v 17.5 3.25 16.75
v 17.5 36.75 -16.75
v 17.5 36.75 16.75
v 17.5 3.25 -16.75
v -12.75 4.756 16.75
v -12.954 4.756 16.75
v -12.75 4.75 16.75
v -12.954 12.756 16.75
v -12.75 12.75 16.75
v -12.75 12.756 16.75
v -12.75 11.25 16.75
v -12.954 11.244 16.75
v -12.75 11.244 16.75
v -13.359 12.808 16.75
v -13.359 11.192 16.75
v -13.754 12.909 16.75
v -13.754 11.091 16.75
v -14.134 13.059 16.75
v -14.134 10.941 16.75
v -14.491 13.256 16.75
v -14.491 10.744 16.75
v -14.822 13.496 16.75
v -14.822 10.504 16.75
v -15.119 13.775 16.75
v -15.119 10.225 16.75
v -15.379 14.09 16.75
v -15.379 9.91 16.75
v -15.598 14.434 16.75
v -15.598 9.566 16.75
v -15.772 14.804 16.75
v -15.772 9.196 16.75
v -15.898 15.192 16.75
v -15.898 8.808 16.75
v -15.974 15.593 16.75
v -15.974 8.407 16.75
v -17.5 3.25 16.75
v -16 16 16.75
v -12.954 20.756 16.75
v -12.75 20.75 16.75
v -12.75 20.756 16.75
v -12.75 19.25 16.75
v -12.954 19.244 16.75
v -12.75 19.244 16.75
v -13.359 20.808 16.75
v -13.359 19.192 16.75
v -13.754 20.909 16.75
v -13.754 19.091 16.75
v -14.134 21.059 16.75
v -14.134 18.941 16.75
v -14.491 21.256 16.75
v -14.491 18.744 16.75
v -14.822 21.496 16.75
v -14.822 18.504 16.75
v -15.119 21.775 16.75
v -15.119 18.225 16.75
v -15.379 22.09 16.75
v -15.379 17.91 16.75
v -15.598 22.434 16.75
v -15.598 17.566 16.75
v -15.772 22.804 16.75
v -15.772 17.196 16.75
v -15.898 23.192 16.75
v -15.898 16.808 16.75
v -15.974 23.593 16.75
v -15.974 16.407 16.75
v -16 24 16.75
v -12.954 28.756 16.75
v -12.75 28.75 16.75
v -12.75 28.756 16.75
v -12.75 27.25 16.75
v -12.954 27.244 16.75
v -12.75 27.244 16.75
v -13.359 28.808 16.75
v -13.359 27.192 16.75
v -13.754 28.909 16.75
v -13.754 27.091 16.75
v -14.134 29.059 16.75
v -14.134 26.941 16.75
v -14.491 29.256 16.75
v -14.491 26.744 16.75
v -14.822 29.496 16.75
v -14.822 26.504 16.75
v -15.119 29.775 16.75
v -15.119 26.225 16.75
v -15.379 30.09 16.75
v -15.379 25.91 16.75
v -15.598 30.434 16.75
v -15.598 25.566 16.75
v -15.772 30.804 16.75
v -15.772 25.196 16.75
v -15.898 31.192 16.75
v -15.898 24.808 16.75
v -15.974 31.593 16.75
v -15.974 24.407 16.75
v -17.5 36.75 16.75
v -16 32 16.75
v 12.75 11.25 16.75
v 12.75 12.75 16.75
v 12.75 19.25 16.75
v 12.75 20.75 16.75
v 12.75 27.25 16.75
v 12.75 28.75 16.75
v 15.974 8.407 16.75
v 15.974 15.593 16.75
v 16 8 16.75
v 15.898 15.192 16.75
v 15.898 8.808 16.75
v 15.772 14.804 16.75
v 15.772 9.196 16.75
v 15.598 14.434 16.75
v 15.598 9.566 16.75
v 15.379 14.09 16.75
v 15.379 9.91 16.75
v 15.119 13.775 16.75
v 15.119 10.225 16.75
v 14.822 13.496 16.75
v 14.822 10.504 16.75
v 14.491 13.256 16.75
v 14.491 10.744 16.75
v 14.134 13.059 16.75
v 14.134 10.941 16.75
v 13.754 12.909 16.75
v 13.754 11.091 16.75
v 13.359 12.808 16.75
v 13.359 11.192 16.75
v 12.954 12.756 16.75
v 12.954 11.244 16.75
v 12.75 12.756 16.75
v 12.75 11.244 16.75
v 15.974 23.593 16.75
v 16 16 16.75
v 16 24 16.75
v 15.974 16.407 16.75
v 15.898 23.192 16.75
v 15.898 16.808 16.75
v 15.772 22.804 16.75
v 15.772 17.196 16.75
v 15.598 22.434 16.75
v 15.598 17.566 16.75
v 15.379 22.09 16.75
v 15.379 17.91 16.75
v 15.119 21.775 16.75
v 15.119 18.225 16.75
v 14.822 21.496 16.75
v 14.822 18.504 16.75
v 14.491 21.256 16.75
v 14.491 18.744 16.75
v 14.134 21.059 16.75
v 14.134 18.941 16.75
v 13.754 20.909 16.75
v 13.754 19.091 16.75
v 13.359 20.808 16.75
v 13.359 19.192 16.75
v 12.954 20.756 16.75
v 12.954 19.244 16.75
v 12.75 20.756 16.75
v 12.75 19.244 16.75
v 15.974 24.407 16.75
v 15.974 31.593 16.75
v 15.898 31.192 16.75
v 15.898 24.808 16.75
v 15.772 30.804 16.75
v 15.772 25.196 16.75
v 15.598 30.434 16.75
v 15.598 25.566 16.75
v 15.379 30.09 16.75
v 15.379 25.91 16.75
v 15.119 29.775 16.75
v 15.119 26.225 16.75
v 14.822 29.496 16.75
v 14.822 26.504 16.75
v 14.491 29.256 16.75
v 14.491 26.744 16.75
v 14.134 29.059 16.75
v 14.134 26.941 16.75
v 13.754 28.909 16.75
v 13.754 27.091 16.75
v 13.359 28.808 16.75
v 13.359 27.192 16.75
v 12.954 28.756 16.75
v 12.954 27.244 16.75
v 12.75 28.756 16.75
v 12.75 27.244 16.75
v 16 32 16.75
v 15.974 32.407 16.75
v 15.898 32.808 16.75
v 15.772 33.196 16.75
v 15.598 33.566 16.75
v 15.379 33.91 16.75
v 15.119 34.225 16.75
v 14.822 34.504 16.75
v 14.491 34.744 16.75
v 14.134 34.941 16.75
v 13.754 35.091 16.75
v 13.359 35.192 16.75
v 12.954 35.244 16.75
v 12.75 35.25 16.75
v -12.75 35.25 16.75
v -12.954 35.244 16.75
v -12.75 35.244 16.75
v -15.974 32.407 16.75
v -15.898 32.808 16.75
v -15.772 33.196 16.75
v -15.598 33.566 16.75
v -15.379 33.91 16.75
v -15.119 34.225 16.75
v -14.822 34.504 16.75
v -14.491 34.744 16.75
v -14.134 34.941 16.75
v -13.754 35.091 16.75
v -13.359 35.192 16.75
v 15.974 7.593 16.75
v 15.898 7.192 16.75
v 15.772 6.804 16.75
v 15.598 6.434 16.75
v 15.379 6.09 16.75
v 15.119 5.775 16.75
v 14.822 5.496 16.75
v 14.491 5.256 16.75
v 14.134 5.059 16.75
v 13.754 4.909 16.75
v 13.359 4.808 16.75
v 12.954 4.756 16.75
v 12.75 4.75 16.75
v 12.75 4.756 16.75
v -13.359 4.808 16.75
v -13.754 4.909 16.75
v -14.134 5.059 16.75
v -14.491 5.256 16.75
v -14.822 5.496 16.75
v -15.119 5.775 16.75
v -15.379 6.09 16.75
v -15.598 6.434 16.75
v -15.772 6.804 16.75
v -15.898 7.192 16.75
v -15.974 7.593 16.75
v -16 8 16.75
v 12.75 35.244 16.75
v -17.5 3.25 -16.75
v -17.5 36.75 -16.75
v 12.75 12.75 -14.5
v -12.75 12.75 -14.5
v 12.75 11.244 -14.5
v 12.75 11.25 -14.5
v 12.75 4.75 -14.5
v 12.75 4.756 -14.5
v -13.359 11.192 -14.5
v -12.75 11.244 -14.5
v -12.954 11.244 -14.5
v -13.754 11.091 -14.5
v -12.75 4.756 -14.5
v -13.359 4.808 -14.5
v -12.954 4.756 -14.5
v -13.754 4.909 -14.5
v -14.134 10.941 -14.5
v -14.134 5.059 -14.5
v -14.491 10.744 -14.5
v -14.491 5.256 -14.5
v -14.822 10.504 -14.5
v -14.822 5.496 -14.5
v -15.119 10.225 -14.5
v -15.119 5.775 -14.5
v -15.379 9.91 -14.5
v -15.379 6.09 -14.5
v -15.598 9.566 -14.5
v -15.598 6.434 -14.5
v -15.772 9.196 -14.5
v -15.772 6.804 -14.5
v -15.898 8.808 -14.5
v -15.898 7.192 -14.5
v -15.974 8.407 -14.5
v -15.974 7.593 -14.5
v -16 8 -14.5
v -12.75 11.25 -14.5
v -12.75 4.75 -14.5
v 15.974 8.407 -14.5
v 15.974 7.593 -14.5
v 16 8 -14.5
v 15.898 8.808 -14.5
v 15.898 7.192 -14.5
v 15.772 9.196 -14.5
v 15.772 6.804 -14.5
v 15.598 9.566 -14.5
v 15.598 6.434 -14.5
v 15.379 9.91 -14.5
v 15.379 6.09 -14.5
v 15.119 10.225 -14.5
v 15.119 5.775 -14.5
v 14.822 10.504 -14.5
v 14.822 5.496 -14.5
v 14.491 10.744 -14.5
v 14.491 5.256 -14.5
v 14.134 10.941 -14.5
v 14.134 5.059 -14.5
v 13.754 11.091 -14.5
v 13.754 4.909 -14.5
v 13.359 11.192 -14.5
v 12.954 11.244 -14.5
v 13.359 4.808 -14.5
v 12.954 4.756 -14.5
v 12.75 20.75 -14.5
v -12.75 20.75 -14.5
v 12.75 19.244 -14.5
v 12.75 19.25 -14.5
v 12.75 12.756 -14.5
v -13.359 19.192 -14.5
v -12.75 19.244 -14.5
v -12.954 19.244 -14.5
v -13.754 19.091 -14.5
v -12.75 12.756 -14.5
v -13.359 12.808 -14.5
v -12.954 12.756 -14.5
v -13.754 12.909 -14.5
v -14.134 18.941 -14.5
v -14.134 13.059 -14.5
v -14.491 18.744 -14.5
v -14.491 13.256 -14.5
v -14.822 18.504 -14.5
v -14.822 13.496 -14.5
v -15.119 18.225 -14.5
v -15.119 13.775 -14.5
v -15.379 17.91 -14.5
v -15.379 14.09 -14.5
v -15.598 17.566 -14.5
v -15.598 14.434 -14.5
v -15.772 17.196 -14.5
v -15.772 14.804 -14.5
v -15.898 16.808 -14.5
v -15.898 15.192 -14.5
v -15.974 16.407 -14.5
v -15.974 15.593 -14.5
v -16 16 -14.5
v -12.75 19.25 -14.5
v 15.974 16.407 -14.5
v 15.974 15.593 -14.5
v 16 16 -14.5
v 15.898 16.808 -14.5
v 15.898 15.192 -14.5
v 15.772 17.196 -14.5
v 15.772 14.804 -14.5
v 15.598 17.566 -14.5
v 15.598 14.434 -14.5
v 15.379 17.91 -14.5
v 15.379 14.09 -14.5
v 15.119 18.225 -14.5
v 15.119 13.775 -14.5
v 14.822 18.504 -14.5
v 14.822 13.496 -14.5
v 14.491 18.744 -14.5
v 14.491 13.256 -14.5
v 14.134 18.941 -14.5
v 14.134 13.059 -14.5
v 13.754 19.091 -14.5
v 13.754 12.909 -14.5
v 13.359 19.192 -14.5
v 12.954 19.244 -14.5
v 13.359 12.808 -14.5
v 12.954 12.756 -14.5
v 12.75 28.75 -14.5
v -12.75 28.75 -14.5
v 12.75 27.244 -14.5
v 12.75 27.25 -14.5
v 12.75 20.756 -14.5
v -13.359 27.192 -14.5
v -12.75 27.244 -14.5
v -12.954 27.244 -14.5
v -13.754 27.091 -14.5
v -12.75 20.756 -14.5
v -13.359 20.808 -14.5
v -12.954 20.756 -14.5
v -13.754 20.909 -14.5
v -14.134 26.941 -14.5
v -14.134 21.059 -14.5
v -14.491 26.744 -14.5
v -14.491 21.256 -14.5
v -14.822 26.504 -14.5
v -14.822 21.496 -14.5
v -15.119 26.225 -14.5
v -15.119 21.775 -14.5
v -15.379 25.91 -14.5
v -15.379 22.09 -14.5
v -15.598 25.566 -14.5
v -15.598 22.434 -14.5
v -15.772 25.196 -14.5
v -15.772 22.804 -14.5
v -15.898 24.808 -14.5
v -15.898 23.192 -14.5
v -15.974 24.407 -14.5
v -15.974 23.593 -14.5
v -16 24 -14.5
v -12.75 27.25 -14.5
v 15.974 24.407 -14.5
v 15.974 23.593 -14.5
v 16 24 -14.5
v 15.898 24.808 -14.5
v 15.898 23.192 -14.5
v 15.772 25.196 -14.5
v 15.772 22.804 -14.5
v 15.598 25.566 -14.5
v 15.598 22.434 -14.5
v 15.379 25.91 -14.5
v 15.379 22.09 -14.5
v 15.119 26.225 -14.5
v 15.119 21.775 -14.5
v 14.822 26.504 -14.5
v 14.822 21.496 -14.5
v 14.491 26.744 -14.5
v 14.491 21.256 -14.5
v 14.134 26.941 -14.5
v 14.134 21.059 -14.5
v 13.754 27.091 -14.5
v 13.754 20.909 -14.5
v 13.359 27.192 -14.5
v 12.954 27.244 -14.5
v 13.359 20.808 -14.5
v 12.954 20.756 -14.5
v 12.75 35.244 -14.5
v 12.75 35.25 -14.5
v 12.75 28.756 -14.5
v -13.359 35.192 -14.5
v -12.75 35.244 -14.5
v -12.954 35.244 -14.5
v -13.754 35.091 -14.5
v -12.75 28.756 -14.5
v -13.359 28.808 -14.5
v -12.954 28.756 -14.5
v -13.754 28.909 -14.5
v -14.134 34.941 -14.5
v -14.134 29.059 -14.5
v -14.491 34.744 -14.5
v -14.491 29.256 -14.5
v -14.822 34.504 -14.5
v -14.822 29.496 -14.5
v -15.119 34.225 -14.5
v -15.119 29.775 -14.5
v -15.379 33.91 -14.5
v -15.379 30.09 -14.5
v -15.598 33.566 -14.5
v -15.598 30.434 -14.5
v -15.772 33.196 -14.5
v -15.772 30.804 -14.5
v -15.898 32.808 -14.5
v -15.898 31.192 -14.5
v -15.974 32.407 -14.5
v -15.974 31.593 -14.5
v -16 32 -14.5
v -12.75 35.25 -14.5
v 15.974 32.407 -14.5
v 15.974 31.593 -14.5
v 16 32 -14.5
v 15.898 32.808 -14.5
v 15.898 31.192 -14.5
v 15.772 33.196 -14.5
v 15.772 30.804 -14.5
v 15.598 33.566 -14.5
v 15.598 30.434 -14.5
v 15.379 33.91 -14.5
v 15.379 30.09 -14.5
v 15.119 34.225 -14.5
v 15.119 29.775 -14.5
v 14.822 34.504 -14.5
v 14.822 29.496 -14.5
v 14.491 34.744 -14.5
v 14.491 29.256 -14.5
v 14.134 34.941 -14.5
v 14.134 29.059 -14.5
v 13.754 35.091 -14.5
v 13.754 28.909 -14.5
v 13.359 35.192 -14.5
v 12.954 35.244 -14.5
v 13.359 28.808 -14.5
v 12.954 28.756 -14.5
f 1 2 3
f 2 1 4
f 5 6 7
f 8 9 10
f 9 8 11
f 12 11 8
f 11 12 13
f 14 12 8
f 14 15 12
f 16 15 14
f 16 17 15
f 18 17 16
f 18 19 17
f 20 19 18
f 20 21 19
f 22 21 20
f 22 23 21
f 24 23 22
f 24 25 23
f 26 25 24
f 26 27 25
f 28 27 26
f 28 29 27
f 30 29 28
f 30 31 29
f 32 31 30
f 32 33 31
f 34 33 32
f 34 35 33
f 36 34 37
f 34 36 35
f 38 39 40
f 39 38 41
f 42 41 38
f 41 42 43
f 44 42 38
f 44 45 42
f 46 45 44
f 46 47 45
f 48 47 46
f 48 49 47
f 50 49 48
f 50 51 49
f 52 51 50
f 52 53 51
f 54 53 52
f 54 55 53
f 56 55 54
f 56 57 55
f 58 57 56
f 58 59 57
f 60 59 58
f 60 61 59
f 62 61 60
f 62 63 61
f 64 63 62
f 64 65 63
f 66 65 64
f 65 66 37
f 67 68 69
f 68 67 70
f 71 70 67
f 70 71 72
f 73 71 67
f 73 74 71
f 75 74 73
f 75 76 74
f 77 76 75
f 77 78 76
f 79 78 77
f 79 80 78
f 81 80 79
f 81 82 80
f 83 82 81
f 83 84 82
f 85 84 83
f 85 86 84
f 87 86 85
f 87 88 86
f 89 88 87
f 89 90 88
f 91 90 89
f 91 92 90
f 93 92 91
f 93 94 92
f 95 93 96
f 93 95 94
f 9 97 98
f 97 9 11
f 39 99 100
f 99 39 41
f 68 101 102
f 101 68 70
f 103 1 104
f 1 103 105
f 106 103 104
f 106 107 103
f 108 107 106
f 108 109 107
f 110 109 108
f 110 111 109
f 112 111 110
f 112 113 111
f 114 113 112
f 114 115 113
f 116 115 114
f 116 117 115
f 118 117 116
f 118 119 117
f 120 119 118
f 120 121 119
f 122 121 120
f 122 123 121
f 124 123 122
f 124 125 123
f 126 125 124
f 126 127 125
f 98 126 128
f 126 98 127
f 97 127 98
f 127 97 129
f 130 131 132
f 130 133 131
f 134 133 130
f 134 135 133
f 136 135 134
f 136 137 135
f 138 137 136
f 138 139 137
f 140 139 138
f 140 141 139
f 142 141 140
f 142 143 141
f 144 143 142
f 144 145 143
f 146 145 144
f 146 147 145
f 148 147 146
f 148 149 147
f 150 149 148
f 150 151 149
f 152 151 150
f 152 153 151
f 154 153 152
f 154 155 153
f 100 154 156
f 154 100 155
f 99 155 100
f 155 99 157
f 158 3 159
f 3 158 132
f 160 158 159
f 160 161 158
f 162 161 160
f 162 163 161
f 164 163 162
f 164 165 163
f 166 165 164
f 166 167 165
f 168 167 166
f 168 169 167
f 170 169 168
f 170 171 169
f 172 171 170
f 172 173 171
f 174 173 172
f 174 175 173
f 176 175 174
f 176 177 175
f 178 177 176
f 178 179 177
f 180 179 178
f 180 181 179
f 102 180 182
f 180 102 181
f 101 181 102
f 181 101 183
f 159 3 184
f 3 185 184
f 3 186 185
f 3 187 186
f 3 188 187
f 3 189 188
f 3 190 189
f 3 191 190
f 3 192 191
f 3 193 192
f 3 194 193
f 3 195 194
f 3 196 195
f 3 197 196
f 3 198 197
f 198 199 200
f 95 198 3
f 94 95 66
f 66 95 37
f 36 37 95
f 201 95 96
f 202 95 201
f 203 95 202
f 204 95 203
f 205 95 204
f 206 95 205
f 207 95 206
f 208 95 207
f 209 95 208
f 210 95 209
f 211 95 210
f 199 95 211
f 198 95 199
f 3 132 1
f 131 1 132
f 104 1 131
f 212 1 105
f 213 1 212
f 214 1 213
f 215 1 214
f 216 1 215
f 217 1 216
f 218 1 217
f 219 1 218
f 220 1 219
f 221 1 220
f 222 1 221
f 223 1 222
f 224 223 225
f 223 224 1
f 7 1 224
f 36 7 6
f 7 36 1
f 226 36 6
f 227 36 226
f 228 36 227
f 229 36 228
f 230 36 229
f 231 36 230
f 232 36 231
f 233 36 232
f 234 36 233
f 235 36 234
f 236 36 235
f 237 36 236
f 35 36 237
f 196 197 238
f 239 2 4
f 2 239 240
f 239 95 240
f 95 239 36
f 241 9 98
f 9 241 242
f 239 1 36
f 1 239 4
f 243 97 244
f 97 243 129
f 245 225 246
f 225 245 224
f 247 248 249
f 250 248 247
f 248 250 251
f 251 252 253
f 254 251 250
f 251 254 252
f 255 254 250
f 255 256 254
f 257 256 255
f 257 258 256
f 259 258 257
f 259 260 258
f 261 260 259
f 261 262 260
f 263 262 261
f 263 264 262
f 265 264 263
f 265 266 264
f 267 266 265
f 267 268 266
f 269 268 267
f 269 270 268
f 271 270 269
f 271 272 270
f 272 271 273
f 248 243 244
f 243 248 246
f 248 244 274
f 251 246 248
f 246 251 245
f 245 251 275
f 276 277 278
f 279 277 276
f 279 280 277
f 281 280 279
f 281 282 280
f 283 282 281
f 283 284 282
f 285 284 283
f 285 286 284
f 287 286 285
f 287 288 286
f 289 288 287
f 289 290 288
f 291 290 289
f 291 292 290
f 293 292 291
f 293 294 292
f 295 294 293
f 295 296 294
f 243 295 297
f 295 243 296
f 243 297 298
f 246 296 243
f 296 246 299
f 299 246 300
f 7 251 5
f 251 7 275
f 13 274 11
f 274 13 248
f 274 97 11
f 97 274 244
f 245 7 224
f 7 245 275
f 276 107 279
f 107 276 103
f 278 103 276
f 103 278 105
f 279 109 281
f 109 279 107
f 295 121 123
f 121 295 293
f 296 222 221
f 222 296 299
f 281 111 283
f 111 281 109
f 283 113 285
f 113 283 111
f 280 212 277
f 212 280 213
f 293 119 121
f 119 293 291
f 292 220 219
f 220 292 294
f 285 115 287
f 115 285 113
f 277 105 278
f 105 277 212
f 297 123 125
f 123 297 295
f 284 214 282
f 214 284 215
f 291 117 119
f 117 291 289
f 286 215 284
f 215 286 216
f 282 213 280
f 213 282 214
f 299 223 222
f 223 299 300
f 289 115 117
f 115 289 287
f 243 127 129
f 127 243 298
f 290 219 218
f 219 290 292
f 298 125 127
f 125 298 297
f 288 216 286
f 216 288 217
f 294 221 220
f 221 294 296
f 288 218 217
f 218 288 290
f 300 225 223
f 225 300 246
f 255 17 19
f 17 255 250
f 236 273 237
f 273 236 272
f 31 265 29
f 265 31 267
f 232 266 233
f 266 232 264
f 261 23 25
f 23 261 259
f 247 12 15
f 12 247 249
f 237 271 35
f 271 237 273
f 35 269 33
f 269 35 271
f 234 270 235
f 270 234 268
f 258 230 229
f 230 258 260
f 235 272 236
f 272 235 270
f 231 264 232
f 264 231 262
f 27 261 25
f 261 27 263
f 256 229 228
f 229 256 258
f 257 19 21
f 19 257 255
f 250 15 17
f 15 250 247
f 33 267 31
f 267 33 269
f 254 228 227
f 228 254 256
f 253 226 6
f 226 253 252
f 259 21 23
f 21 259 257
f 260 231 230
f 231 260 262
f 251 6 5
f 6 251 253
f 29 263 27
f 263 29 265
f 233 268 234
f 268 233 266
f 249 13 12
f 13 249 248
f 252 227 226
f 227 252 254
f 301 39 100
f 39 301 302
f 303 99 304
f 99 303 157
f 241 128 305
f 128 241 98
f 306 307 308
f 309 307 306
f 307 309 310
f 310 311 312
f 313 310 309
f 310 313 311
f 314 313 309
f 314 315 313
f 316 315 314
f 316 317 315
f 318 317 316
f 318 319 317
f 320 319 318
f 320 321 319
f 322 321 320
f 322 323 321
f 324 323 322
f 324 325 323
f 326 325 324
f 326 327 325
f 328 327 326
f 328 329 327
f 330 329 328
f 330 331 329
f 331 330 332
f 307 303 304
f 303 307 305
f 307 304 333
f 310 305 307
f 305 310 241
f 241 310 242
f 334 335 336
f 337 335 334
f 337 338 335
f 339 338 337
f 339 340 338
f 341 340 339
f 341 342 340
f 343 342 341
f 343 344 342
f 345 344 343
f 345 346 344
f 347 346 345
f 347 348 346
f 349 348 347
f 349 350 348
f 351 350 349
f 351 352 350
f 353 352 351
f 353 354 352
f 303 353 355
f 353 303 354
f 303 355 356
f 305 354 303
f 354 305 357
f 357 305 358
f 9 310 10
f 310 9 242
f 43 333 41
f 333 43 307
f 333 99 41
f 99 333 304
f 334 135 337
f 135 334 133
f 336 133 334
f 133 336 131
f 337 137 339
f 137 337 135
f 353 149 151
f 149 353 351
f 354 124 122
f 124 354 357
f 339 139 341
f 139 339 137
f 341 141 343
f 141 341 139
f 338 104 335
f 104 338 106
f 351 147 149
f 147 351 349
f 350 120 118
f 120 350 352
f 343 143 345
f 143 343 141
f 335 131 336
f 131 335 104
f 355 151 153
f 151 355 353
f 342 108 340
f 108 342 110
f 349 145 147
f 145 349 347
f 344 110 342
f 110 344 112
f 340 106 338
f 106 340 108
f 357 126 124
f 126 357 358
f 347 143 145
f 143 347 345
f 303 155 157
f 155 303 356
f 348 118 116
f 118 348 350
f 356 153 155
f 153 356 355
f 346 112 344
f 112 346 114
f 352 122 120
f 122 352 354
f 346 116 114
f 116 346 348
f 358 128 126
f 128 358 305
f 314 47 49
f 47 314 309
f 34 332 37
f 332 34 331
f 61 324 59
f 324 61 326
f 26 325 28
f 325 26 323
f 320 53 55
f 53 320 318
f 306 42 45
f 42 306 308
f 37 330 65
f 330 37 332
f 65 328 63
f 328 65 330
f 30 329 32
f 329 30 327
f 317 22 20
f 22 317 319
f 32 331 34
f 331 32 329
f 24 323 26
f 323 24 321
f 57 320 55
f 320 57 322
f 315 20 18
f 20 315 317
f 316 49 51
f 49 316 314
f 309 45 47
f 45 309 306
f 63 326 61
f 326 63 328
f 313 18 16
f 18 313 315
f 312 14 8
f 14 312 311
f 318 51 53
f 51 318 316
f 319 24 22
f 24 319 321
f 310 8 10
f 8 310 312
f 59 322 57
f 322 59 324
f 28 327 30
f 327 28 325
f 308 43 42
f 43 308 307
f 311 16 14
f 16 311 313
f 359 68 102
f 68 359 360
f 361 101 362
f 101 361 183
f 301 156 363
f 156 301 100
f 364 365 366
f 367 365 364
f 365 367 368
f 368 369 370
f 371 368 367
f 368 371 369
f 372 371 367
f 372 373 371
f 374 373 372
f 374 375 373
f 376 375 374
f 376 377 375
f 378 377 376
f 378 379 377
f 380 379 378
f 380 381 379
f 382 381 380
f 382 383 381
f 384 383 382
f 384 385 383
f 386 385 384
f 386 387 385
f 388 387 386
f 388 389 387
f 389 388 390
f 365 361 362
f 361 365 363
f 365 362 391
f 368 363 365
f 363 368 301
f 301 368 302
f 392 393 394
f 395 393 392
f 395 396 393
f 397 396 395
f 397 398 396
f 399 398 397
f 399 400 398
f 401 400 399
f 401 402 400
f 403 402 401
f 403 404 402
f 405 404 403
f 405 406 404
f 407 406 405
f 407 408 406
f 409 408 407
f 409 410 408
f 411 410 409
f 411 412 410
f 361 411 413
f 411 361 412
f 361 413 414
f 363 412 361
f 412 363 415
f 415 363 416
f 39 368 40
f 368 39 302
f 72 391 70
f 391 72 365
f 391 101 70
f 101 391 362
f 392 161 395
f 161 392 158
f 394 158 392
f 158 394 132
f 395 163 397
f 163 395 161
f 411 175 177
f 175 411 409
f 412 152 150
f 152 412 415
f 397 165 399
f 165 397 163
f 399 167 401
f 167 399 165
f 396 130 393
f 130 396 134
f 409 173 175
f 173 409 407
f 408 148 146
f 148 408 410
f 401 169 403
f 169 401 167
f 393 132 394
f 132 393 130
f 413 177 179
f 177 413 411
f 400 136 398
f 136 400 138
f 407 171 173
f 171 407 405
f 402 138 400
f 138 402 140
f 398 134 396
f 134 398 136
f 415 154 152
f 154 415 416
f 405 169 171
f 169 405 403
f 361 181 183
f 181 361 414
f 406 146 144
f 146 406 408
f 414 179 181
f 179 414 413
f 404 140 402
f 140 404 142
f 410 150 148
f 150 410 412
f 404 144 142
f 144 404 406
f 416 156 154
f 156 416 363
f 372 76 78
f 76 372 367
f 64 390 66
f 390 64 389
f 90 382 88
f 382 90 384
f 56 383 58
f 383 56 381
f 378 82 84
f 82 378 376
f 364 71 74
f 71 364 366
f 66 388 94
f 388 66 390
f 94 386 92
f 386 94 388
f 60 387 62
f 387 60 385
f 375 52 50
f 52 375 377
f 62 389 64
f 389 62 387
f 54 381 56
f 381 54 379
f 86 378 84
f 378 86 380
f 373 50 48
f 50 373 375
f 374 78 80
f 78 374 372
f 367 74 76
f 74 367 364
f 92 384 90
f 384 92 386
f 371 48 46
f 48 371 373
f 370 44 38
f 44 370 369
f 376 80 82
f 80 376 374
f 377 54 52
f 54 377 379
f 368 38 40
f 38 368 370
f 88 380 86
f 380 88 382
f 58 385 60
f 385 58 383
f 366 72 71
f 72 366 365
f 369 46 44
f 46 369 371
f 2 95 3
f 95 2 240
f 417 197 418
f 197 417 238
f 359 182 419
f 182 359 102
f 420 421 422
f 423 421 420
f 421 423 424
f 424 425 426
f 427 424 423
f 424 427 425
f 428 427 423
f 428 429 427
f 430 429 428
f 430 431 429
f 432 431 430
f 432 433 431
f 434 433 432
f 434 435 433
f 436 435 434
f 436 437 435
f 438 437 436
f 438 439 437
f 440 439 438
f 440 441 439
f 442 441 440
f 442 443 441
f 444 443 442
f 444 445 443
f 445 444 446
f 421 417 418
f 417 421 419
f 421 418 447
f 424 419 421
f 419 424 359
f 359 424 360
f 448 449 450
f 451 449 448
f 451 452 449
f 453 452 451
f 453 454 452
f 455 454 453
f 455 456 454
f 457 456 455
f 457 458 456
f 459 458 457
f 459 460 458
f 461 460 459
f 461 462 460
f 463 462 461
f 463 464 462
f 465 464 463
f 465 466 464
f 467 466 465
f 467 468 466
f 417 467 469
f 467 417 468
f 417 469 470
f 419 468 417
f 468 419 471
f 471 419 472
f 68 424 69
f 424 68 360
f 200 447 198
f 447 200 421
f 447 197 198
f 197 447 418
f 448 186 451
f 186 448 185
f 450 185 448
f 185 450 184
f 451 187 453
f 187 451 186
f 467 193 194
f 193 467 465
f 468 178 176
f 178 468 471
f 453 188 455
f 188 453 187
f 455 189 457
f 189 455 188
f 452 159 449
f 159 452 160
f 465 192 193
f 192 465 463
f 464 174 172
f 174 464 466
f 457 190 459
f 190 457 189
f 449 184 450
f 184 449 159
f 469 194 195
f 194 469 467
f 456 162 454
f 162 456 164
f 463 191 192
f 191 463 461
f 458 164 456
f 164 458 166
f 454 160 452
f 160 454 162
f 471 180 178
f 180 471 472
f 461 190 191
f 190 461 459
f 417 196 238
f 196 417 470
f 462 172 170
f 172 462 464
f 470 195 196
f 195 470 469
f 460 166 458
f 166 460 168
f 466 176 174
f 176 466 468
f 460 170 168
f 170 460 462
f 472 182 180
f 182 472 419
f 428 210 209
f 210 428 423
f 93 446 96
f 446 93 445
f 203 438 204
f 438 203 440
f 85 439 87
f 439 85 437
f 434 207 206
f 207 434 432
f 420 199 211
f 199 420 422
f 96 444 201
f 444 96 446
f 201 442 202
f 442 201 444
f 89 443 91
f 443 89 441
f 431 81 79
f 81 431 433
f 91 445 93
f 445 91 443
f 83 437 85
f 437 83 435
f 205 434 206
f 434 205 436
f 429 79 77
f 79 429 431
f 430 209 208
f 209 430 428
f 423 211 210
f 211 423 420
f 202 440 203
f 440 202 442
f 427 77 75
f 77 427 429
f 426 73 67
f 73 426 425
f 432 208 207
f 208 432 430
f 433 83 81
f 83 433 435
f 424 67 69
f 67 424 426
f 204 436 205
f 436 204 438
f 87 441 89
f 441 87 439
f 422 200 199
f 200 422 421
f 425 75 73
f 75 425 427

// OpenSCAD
//preview[view:south,tilt:top]

//CUSTOMIZER VARIABLES

// Number of Batteries 
batteryCount = 4; // [1:12]

// Wall thickness
wallThickness = 1.5; // [1.0:Thin Wall 1.0mm,1.5:Lightweight Wall 1.5mm,2.0:Strong Wall 2.0mm,3.0:Thick Wall 3.0mm]

// Shorter than the battery, so you can get a finger grip.
height = 32.0; // [16:34]

//CUSTOMIZER VARIABLES END

/* [hidden] */

// These are the Dimensions of the 
// Nikon EN-EL19  Battery, they fit 
// Snugly w/o too much effort getting
// back out.
bW = 32;
bD = 6.5;



// Build a Single Holder
module batterySlot() {

	difference() {
	   cube( [bW + (wallThickness * 2 ), bD + (wallThickness * 2 ), height + wallThickness], center=true);
	
		translate([0,0, wallThickness])
	   cube( [ bW - bD, bD, height], center=true);
	
	   translate([+(bW / 2) - (bD/2), 0, wallThickness])
	   cylinder(h=height, r=(bD/2), $fn=50, center=true);
	
	   translate([-(bW / 2) + (bD/2), 0, wallThickness])
	   cylinder(h=height, r=(bD/2), $fn=50, center=true);
	
	}
}

// Build the Set
union() {

	for( a =[1:batteryCount]){
		echo (a);

		translate([0, ( bD + wallThickness ) * a, 0])
		batterySlot();
	}
}
